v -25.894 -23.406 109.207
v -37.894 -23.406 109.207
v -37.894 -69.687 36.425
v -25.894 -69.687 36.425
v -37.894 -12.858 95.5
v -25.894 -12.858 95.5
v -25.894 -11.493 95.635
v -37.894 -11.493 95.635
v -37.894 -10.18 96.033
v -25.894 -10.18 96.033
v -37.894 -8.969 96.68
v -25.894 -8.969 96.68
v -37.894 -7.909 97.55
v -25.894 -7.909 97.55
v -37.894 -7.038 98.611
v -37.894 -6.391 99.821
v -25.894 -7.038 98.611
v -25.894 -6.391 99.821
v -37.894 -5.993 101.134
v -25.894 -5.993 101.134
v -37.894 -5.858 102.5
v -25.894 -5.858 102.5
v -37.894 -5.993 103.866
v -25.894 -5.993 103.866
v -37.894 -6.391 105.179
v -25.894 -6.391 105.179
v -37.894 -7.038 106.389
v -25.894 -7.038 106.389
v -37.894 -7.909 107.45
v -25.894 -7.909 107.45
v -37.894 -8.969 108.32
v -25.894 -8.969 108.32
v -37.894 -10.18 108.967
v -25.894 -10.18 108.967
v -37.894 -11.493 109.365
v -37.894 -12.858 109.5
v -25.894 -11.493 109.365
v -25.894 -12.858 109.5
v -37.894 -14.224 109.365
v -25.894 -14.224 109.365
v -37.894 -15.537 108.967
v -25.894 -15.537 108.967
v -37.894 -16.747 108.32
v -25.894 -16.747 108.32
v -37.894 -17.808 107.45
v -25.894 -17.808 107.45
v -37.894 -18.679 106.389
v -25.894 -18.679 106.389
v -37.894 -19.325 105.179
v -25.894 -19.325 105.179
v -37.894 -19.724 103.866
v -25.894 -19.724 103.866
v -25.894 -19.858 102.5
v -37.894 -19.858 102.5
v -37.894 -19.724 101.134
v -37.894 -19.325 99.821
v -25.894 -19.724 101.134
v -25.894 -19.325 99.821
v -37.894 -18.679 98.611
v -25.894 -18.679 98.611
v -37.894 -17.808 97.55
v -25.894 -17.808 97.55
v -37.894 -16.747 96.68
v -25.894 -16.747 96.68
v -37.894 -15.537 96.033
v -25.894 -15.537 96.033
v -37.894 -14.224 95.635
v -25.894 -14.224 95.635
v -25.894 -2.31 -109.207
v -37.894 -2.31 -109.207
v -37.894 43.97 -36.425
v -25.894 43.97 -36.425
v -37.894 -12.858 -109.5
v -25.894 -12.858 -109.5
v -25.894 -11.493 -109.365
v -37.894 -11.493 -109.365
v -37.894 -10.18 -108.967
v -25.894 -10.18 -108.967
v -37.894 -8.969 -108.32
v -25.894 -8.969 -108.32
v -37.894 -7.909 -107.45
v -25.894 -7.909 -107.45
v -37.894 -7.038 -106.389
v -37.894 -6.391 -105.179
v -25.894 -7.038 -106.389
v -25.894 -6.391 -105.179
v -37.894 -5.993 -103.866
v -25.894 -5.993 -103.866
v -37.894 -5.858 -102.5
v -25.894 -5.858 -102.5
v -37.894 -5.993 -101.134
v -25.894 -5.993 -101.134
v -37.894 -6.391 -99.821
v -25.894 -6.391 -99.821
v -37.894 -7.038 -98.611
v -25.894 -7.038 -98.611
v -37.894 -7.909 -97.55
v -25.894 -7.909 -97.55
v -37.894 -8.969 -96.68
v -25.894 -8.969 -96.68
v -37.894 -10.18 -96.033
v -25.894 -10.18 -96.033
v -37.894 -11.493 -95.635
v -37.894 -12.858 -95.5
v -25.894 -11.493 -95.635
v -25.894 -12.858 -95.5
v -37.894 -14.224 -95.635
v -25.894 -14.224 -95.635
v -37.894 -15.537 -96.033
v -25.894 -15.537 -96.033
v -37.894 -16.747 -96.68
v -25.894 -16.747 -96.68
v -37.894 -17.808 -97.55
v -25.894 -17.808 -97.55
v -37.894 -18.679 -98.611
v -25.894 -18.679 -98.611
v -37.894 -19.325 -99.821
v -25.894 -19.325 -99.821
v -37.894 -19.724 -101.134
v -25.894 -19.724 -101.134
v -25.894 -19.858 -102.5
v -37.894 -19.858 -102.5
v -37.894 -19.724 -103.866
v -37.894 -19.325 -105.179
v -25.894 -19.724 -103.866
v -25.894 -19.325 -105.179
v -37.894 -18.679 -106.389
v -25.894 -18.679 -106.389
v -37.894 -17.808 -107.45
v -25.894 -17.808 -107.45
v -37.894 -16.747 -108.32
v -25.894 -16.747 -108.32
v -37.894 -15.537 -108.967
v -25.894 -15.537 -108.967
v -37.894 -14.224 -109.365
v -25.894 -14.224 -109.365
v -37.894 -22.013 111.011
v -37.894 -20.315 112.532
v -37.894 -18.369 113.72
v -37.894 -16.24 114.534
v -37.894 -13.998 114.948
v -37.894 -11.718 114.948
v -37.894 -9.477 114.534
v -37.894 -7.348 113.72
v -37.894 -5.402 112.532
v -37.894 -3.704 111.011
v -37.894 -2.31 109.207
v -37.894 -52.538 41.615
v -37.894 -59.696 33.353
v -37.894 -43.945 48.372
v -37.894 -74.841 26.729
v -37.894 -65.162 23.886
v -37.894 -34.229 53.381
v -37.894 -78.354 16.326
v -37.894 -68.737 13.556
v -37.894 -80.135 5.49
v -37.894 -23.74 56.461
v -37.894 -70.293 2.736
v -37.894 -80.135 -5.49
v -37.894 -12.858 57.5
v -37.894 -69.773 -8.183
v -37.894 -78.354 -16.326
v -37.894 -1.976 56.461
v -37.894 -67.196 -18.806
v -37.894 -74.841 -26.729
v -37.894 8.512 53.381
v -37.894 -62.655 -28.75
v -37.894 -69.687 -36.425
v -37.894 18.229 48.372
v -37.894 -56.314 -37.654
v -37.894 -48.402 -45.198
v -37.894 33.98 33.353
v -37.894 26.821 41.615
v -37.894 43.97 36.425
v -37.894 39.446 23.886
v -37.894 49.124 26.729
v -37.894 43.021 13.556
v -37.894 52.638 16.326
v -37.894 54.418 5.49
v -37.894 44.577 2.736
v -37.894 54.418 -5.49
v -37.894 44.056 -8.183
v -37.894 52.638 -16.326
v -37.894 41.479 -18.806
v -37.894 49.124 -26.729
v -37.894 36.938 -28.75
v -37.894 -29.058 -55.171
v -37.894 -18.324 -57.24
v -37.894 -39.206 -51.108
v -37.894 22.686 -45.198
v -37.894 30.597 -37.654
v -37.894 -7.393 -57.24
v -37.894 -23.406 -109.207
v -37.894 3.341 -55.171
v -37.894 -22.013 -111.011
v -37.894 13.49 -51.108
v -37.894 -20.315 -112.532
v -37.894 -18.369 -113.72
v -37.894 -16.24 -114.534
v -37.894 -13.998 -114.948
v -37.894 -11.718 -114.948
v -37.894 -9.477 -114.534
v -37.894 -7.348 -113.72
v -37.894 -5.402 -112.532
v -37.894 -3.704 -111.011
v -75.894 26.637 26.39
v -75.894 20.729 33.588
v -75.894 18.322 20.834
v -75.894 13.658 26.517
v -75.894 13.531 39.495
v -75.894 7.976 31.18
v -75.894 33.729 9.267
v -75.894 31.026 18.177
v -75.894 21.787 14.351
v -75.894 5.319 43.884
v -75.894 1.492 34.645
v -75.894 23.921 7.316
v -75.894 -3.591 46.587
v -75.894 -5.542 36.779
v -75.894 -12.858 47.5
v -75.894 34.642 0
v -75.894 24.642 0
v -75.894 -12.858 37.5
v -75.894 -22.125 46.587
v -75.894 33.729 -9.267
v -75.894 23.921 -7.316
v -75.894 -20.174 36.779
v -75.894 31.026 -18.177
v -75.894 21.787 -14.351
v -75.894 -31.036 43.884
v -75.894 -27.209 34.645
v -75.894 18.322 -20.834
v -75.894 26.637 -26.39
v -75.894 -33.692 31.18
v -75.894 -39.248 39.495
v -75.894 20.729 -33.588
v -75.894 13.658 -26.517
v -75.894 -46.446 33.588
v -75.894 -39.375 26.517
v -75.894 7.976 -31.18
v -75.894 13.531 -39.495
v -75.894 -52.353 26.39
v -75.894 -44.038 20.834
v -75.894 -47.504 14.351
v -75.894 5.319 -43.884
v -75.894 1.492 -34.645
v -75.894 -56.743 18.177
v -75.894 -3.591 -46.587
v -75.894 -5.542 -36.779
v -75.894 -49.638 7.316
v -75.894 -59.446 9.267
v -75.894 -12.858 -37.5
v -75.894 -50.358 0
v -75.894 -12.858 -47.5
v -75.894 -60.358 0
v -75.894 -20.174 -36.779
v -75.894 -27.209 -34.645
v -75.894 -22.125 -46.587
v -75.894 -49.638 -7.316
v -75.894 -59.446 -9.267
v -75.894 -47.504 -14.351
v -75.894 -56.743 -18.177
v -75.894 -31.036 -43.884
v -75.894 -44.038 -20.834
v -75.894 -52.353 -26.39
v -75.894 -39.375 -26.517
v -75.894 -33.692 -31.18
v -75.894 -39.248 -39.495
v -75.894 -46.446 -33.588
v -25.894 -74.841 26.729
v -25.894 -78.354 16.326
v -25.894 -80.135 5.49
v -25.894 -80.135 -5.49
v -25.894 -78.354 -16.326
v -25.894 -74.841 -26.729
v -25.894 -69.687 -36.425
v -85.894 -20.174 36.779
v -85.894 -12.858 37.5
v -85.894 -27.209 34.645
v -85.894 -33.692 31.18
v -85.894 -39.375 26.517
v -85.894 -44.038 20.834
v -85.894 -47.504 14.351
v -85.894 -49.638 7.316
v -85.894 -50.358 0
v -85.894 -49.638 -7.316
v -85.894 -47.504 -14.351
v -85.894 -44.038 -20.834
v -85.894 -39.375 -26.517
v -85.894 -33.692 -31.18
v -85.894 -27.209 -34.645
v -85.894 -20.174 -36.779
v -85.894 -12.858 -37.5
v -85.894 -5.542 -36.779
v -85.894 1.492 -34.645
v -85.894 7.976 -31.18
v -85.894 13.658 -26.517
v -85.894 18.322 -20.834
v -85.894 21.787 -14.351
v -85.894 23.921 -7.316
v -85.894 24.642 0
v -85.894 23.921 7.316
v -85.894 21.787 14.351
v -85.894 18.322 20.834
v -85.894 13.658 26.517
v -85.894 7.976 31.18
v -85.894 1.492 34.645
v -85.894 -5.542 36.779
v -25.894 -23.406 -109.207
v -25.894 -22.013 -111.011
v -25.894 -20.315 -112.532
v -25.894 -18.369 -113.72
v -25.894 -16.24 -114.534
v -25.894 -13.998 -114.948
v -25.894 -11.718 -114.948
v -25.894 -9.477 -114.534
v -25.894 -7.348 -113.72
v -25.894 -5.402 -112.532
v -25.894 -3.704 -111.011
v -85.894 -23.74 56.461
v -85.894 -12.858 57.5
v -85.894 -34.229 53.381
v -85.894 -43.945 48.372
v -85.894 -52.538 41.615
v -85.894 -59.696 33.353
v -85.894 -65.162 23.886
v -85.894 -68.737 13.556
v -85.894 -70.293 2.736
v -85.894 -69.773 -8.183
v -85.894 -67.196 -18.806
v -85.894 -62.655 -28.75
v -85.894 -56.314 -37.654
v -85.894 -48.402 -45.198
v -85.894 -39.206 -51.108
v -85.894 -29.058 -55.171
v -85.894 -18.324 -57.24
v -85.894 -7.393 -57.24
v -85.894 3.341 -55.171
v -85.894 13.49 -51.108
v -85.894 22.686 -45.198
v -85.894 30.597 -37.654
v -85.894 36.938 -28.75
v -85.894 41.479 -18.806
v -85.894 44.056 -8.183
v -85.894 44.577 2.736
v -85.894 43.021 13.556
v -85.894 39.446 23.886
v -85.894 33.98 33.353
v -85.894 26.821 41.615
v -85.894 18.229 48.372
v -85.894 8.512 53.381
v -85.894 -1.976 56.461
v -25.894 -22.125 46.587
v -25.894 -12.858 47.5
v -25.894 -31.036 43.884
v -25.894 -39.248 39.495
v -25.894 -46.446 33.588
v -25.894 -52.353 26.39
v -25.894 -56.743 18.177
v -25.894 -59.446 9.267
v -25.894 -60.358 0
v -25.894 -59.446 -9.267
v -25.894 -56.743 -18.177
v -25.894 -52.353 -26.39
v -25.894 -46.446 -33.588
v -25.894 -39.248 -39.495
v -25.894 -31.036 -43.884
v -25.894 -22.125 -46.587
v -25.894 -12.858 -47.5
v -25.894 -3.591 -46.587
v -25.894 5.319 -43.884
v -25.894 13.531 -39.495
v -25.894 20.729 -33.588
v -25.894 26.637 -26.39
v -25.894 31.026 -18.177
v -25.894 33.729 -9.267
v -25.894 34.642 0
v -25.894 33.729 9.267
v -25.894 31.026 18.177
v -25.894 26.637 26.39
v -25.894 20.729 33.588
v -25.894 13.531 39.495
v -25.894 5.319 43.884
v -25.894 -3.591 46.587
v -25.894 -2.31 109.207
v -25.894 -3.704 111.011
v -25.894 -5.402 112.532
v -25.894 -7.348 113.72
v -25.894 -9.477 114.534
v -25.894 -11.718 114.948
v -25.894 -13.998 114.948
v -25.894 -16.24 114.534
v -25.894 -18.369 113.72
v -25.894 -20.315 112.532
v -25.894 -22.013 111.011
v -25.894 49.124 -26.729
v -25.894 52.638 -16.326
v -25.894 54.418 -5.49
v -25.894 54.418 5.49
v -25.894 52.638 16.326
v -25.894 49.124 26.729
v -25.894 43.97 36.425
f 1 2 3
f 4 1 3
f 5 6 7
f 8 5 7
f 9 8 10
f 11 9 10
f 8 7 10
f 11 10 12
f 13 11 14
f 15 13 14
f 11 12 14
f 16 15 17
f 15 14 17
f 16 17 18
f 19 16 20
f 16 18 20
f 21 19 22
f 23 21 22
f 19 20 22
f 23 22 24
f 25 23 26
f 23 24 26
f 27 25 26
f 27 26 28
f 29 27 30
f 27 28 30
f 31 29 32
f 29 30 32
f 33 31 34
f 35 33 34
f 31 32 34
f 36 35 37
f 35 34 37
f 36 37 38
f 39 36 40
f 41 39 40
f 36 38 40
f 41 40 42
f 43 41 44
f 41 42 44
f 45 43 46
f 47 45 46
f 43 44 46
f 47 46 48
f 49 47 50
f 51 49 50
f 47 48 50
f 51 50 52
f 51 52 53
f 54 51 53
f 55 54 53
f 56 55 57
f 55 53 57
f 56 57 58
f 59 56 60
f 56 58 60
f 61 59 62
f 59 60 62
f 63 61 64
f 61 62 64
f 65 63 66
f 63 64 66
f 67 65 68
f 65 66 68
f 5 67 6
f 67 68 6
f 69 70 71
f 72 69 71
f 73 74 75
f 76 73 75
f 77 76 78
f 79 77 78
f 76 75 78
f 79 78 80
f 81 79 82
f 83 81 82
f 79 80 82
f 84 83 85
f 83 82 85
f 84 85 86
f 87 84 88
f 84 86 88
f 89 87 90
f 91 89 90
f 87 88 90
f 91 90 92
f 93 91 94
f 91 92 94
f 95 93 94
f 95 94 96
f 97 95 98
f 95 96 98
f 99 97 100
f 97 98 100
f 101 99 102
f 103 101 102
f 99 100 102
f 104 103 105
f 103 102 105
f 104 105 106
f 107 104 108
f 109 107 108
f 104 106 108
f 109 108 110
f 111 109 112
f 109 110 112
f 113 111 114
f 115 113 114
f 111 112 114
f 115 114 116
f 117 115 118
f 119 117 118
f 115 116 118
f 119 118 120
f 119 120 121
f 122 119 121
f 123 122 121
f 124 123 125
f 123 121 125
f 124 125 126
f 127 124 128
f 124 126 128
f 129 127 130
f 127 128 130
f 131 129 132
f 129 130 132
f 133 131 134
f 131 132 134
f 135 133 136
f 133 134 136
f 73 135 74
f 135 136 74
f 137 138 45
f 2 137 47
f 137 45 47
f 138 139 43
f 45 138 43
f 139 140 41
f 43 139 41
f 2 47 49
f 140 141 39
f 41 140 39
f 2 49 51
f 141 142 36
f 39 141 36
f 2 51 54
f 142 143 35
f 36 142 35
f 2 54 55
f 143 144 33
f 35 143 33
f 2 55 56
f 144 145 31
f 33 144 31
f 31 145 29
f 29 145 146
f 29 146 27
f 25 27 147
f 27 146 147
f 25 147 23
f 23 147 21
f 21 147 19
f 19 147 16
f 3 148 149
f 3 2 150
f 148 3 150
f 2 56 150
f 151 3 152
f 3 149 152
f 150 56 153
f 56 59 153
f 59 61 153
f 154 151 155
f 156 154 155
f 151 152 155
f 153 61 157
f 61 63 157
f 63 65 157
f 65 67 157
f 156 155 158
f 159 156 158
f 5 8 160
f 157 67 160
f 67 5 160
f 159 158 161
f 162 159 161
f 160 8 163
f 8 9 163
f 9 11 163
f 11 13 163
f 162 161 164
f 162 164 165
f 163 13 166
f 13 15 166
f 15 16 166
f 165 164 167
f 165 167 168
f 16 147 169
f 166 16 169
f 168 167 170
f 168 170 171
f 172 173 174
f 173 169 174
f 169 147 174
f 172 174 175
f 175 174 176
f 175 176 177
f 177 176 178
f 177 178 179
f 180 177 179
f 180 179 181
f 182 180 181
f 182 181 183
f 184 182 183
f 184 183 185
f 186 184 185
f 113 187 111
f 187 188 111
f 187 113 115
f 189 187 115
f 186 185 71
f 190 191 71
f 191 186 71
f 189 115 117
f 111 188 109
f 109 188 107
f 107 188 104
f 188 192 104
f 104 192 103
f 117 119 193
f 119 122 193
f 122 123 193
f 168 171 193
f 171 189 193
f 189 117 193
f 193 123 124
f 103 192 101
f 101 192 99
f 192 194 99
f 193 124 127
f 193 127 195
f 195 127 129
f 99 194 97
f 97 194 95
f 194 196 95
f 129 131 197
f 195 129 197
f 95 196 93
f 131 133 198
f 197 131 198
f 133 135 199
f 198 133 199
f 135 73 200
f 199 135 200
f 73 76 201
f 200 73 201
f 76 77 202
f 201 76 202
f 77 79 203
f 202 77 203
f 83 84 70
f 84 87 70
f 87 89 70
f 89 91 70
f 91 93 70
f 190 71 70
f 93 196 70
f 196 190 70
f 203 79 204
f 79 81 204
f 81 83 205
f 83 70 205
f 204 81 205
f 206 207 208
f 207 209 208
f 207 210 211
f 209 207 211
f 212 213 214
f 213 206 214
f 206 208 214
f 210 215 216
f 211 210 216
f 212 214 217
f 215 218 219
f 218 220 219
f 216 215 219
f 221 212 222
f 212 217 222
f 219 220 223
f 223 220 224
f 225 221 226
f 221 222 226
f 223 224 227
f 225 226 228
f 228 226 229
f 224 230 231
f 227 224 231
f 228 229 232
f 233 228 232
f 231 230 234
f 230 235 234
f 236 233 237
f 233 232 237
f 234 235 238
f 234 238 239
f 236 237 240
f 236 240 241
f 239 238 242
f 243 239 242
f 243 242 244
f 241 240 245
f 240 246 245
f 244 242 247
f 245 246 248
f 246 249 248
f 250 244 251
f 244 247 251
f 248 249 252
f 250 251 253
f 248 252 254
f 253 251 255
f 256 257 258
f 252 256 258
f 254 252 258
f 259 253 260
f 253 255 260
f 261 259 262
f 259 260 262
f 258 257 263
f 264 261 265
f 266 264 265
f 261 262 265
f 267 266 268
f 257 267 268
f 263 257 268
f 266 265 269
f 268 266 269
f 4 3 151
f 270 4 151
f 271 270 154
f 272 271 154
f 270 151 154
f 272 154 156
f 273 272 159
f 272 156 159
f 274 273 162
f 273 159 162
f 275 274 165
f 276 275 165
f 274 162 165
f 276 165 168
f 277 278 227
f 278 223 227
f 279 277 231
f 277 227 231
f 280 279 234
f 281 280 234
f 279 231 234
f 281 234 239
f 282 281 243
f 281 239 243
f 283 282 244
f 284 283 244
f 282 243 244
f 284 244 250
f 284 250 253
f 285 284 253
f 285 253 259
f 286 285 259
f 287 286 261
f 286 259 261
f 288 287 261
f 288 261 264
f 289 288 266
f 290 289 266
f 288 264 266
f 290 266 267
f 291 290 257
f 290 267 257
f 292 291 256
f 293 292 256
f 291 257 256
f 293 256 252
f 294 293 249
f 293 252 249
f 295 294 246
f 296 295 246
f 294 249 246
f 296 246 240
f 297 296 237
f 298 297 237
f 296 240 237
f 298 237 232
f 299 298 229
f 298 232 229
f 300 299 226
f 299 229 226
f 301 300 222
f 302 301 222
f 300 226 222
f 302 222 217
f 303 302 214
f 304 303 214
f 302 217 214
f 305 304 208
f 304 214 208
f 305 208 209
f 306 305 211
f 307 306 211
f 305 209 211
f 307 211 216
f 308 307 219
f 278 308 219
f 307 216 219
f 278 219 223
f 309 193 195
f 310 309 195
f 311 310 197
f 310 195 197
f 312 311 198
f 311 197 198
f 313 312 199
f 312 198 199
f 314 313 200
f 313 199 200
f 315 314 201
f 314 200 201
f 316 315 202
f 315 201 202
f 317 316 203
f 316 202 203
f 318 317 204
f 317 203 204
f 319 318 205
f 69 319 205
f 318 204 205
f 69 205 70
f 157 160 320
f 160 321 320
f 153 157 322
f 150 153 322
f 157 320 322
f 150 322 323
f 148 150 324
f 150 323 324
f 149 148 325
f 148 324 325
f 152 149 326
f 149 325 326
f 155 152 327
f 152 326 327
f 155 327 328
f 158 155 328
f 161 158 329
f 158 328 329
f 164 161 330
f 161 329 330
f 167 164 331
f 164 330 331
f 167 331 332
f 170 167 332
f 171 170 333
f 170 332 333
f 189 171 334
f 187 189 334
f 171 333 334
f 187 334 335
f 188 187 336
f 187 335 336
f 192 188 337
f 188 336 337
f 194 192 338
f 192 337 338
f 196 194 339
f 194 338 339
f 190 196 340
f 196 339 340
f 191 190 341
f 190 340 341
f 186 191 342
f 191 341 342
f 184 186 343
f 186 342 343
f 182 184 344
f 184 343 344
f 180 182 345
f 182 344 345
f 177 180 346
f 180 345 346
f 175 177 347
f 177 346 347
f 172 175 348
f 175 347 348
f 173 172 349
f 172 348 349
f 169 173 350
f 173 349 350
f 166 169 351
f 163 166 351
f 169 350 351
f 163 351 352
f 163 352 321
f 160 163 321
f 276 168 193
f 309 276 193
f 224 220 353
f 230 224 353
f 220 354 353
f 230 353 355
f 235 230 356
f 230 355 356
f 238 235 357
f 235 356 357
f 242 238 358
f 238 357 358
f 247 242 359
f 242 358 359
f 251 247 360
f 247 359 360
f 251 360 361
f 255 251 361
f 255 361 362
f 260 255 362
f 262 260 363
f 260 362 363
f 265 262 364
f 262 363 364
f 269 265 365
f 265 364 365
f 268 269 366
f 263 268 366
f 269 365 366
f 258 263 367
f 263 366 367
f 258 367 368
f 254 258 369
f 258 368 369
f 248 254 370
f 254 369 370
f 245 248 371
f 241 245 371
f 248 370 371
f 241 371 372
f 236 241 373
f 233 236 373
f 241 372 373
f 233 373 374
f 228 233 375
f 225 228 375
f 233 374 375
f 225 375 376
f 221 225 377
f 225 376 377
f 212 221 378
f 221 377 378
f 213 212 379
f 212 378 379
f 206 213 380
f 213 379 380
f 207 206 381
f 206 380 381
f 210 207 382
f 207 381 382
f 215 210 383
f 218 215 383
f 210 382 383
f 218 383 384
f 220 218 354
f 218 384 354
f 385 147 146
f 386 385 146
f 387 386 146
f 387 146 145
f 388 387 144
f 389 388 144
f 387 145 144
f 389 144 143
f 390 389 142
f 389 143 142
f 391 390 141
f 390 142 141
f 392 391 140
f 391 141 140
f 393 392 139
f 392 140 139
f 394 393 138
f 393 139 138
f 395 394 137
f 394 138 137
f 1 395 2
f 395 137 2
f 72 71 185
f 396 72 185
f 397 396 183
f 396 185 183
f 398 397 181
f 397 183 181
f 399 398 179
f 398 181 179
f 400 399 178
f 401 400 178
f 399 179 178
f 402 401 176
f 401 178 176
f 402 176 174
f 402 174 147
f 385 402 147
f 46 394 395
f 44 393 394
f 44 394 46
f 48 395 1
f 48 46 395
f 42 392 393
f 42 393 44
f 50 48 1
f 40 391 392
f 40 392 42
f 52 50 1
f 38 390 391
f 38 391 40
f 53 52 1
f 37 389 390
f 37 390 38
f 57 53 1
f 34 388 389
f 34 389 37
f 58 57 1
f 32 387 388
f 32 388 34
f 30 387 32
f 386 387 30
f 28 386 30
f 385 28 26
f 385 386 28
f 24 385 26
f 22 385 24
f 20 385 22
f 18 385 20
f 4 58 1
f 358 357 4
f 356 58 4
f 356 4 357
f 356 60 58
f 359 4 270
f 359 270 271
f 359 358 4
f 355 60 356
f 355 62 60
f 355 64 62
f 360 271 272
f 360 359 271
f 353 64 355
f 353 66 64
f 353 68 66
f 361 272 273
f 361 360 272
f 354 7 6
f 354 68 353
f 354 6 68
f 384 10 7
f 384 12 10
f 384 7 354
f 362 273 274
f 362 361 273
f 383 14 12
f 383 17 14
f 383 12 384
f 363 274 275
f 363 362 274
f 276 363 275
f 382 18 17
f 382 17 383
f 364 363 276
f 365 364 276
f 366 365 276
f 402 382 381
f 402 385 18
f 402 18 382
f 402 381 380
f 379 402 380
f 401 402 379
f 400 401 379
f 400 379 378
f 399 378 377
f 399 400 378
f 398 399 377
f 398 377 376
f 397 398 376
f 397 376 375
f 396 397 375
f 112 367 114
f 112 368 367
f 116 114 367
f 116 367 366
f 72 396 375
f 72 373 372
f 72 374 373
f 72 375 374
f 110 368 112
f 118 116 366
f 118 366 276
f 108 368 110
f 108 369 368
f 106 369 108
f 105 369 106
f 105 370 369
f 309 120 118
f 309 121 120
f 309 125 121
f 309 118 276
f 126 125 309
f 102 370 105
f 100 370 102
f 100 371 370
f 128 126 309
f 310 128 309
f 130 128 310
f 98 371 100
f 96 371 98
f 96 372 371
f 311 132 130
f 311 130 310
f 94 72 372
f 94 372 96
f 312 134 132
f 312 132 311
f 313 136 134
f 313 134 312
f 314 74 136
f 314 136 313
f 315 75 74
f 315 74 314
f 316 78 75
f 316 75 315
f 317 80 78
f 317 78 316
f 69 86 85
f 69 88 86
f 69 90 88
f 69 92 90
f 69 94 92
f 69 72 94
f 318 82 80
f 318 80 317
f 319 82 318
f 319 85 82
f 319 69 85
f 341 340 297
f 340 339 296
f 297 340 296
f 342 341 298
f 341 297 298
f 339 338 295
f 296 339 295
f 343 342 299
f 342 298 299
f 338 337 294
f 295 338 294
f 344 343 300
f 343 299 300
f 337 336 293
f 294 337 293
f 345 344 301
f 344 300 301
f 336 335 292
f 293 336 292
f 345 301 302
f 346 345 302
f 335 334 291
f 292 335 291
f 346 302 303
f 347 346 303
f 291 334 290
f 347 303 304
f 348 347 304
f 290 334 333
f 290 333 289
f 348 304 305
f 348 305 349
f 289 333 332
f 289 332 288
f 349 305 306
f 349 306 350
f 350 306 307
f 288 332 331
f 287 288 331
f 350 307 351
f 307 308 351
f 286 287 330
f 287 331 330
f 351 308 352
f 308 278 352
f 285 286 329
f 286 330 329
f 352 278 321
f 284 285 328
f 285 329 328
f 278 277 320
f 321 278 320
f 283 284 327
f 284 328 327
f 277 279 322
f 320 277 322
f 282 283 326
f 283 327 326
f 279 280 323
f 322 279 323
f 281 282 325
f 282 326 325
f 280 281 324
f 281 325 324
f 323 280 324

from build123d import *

# Parameters (mm, degrees)
BOSS_EXTRUDE1_START = -12
SKETCH2_R           = 57.5
BOSS_EXTRUDE1_DEPTH = 12
SKETCH3_R           = 7
CUT_EXTRUDE1_DEPTH  = 12


with BuildPart() as part:
    # Sketch1 → Revolve1 (revolve)
    with BuildSketch(Plane.XY, mode=Mode.PRIVATE) as revolve1_sk:
        Polygon((-75.893975687, 34.641714336), (-25.893975687, 34.641714336), (-25.893975687, 44.641714336), (-85.893975687, 44.641714336), (-85.893975687, 24.641714336), (-75.893975687, 24.641714336), align=None)
    revolve(revolve1_sk.sketch.rotate(Axis((-85.893975687, -12.858285664, 0), (1, 0, 0)), 90), axis=Axis((-85.893975687, -12.858285664, 0), (1, 0, 0)))

    # Sketch2 → Boss-Extrude1 (add)
    with BuildSketch(Plane(origin=(-25.893975687, 0, 0), x_dir=(0, 0, -1), z_dir=(1, 0, 0)).offset(BOSS_EXTRUDE1_START)):
        with BuildLine():
            Line((36.425087952, -69.686649776), (109.207263185, -23.406395474))
            ThreePointArc((109.207263185, -23.406395474), (115, -12.858285664), (109.207263185, -2.310175853))
            Line((109.207263185, -2.310175853), (36.425087952, 43.970078449))
            ThreePointArc((36.425087952, 43.970078449), (0, 54.641714336), (-36.425087952, 43.970078449))
            Line((-36.425087952, 43.970078449), (-109.207263185, -2.310175853))
            ThreePointArc((-109.207263185, -2.310175853), (-115, -12.858285664), (-109.207263185, -23.406395474))
            Line((-109.207263185, -23.406395474), (-36.425087952, -69.686649776))
            ThreePointArc((-36.425087952, -69.686649776), (0, -80.358285664), (36.425087952, -69.686649776))
        make_face()
        with Locations(Location((0, -12.858285664, 0), (0, 0, 180))):
            Circle(SKETCH2_R, mode=Mode.SUBTRACT)
    extrude(amount=BOSS_EXTRUDE1_DEPTH)

    # Sketch3 → Cut-Extrude1 (cut)
    with BuildSketch(Plane(origin=(-25.893975687, 0, 0), x_dir=(0, 0, -1), z_dir=(1, 0, 0))):
        with Locations((-102.5, -12.858285664)):
            Circle(SKETCH3_R)
        with Locations((102.5, -12.858285664)):
            Circle(SKETCH3_R)
    extrude(amount=-CUT_EXTRUDE1_DEPTH, mode=Mode.SUBTRACT)


solid = part.part
